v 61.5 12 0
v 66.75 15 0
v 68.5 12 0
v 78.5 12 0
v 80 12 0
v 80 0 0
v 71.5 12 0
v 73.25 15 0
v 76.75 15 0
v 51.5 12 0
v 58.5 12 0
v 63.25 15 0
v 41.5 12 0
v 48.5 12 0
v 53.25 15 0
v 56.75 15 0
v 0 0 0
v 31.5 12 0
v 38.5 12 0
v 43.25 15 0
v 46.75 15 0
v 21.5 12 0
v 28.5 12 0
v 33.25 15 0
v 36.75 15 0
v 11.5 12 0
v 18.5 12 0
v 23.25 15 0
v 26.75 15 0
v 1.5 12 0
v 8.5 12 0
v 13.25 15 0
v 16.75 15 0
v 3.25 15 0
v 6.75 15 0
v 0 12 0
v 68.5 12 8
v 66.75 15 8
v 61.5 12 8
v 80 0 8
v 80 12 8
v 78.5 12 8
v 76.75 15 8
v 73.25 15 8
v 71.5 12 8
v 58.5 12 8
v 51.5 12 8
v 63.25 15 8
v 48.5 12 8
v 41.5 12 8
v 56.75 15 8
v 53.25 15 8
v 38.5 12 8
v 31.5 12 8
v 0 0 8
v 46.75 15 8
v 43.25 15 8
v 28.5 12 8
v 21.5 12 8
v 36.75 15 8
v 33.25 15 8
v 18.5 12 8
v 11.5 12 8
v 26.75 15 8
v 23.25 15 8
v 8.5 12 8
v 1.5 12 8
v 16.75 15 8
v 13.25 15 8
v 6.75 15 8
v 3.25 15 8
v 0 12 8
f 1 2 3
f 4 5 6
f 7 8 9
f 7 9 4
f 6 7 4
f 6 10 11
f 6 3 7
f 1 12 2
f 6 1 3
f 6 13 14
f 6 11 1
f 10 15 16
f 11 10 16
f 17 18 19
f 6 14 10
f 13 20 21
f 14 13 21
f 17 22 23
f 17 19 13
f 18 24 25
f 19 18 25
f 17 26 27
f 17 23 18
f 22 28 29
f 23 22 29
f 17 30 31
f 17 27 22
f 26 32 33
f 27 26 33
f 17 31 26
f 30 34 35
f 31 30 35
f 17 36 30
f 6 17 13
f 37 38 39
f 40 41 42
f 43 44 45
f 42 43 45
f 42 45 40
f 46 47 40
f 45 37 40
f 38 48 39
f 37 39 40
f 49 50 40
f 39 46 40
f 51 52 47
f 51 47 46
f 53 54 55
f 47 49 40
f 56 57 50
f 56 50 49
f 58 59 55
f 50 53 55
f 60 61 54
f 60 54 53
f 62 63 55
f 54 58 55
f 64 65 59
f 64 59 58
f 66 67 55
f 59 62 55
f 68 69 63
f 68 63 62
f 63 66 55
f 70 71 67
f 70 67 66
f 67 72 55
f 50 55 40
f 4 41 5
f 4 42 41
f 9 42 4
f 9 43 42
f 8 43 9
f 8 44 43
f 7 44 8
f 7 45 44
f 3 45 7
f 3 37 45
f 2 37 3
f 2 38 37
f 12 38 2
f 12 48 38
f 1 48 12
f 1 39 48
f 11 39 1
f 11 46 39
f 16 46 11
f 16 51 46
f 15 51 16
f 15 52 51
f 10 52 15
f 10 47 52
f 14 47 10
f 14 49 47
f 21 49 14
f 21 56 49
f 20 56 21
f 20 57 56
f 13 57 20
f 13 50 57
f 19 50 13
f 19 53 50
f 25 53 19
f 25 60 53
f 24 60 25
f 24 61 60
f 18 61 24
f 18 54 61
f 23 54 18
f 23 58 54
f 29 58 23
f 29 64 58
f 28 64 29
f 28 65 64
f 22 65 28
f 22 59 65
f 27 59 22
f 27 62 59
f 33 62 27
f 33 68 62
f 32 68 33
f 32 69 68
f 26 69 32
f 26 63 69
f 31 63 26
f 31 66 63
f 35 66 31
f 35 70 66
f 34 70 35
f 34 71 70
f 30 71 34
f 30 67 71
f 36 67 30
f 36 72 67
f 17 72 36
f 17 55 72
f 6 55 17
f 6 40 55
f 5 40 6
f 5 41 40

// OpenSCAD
$fn = 32;

// ----------------------------------------------------------------------
// Gear rack: 8 teeth, pitch 10 mm
// ----------------------------------------------------------------------

// --- parameters (mm) ---
teeth = 8;                // number of teeth
pitch = 10;               // tooth pitch, X
root_w = 7;               // tooth width at the root
tip_w = 3.5;              // tooth width at the tip
base_h = 12;              // rack body height, Y
tooth_h = 3;              // tooth height above the body
plate_t = 8;              // rack width, Z (extrusion height)

rack_l = teeth * pitch;  // overall length
total_h = base_h + tooth_h;  // overall height

profile = [[0, 0], [80, 0], [80, 12], [78.5, 12], [76.75, 15], [73.25, 15], [71.5, 12], [68.5, 12], [66.75, 15], [63.25, 15], [61.5, 12], [58.5, 12], [56.75, 15], [53.25, 15], [51.5, 12], [48.5, 12], [46.75, 15], [43.25, 15], [41.5, 12], [38.5, 12], [36.75, 15], [33.25, 15], [31.5, 12], [28.5, 12], [26.75, 15], [23.25, 15], [21.5, 12], [18.5, 12], [16.75, 15], [13.25, 15], [11.5, 12], [8.5, 12], [6.75, 15], [3.25, 15], [1.5, 12], [0, 12]];  // primary outline, 36 points, counter clockwise

// --- the one profile operation ---
linear_extrude(height = plate_t) polygon(points = profile);
